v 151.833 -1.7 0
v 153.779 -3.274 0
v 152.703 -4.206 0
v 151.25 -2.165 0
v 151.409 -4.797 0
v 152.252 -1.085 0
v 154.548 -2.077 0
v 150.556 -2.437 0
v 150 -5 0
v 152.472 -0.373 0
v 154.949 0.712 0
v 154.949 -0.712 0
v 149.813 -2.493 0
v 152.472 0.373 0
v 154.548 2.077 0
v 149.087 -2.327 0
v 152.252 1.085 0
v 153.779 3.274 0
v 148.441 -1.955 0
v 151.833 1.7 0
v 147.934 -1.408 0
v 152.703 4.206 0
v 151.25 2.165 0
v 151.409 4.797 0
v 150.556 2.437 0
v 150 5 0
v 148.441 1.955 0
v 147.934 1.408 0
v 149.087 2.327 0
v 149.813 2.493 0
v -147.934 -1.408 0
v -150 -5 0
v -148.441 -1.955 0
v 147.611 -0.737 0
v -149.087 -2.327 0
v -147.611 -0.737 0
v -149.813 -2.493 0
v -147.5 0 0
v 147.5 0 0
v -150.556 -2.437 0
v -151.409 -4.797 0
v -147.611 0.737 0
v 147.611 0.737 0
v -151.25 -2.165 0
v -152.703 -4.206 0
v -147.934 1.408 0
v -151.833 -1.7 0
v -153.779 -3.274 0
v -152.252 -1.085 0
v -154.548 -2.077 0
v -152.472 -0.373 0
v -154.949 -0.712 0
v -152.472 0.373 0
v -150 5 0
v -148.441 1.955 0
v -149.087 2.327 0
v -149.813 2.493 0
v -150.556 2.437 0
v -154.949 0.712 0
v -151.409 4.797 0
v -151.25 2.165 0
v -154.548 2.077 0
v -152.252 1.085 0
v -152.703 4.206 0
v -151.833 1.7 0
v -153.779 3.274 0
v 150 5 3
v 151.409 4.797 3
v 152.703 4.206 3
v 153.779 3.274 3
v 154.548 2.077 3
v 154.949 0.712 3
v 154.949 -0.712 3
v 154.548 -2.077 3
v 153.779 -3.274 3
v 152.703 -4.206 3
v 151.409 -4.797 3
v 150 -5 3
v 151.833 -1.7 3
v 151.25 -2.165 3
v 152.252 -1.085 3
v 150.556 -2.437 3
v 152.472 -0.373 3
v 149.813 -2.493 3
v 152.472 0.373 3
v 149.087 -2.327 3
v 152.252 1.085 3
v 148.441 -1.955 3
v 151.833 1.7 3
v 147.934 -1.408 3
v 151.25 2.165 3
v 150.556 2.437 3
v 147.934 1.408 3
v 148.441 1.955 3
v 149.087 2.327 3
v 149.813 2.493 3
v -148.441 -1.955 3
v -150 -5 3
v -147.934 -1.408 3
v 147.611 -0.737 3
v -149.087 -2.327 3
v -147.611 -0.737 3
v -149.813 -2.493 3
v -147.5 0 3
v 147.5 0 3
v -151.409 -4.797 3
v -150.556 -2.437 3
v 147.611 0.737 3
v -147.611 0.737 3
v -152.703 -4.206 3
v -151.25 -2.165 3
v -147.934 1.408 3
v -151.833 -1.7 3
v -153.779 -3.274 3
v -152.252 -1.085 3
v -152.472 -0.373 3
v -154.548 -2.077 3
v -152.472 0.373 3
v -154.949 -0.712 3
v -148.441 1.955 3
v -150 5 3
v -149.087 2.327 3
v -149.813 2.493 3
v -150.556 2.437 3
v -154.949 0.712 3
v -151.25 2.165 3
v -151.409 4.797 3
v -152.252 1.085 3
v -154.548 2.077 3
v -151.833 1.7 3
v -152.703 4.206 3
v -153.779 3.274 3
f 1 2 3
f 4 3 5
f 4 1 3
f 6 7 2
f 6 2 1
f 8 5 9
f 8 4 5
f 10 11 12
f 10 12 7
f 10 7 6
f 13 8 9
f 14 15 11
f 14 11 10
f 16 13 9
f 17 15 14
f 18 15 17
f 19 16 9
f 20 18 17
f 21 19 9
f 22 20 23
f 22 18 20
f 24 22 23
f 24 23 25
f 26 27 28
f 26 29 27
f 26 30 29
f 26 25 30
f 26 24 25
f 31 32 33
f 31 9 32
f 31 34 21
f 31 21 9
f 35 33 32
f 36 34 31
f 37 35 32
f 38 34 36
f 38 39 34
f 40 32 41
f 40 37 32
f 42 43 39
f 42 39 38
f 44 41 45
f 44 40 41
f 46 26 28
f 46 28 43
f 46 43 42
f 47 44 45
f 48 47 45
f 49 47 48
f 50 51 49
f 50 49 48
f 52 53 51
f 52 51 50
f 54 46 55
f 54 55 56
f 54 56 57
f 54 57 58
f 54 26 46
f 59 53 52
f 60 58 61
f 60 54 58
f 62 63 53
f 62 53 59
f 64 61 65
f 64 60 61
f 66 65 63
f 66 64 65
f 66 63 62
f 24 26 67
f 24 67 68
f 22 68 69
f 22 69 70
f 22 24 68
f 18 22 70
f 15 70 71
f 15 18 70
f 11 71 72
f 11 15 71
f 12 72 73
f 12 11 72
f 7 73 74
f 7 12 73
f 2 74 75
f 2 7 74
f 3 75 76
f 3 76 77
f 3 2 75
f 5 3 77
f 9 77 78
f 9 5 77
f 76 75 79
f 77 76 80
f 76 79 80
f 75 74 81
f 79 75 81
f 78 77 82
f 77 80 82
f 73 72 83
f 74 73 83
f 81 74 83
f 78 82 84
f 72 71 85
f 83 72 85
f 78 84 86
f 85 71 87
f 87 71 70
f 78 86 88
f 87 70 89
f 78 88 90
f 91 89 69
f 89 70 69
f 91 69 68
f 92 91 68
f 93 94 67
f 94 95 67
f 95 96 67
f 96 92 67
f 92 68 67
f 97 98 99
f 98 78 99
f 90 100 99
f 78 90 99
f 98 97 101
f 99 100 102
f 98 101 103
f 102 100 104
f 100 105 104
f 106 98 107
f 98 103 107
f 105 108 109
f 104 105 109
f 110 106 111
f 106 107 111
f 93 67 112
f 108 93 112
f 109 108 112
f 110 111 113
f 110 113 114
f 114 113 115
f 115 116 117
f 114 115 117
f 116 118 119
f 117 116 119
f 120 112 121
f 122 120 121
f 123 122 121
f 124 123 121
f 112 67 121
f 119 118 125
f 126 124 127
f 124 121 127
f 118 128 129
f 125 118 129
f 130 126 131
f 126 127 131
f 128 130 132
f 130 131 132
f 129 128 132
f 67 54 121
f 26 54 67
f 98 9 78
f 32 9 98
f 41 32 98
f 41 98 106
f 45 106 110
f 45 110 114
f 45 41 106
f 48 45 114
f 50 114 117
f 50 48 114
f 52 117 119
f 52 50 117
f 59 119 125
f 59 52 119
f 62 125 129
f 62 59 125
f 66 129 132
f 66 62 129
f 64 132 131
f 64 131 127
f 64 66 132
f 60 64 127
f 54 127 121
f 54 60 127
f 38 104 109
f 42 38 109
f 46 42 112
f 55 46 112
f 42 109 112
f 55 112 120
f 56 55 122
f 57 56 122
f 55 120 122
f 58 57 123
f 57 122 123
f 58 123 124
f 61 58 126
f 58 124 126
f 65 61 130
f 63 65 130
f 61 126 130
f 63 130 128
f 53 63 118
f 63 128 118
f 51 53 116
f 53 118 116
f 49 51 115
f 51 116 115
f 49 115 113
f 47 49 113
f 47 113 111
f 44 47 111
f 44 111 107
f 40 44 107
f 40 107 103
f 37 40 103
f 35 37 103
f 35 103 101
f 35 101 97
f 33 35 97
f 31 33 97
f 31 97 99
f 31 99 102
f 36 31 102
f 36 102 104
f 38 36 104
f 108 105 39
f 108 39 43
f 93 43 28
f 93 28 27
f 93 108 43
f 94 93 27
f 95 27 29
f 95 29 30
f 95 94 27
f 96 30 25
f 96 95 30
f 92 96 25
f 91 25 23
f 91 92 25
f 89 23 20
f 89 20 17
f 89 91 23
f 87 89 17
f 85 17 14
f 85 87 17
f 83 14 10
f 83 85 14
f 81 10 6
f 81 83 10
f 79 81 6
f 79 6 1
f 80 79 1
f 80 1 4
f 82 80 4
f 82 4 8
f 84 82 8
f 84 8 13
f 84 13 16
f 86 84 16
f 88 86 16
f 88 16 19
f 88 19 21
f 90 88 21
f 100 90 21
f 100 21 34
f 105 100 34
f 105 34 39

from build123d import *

# Parameters (mm, degrees)
BOSS_EXTRUDE1_DEPTH = 3
CUT_EXTRUDE1_REACH  = 157.11
SKETCH2_R           = 2.5


with BuildPart() as part:
    # Sketch1 → Boss-Extrude1 (new body)
    with BuildSketch(Plane.XY):
        with BuildLine():
            Line((-150, 5), (150, 5))
            ThreePointArc((150, 5), (155, 0), (150, -5))
            Line((150, -5), (-150, -5))
            ThreePointArc((-150, -5), (-155, 0), (-150, 5))
        make_face()
    extrude(amount=BOSS_EXTRUDE1_DEPTH)

    # Sketch2 → Cut-Extrude1 (cut, up to next)
    with BuildSketch(Plane.XY.offset(3), mode=Mode.PRIVATE) as cut_extrude1_sk1:
        with Locations((-150, 0)):
            Circle(SKETCH2_R)
    cut_extrude1_tool1 = extrude(cut_extrude1_sk1.sketch, amount=-CUT_EXTRUDE1_REACH, mode=Mode.PRIVATE) & part.part
    cut_extrude1 = cut_extrude1_tool1.solids().sort_by_distance((-150, 0, 3))[0]
    add(cut_extrude1, mode=Mode.SUBTRACT)

    # Mirror1: Cut-Extrude1 across plane
    add(cut_extrude1.mirror(Plane(origin=(0, 0, 0), x_dir=(0, 0, 1), z_dir=(1, 0, 0))), mode=Mode.SUBTRACT)


solid = part.part
